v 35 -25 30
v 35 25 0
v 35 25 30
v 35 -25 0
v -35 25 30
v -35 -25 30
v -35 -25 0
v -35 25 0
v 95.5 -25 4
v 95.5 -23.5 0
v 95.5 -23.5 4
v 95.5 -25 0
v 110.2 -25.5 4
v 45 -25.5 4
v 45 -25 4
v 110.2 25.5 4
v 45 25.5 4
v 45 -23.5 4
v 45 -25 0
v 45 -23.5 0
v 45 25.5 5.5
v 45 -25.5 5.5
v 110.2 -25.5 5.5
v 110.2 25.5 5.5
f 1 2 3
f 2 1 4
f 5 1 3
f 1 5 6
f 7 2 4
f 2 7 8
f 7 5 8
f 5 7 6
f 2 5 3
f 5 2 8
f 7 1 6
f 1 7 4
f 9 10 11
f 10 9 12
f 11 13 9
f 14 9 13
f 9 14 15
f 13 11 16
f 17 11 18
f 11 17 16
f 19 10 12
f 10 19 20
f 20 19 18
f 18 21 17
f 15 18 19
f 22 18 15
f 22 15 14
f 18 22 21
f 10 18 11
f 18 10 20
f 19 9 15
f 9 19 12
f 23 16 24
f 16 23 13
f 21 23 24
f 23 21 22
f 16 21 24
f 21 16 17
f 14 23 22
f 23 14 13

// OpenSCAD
// Two-part enclosure for a small electronics board (e.g. Arduino-based temperature logger)
// Print orientation: both parts rest on the bed (z = 0), side by side, with a 10 mm gap.
// Part 1: box (open top). Part 2: lid (printed upside down, slides into the box).

// ---------------- Parameters ----------------
box_x      = 70;    // box outer length (X)
box_y      = 50;    // box outer width (Y)
box_z      = 30;    // box height (Z)
box_wall   = 2;     // box wall thickness
box_floor  = 2;     // box floor thickness (part of wall, for clarity)

lid_t      = 2;     // lid plate thickness
lip_t      = 1.5;   // lid lip (wall) thickness
lip_h      = 4;     // lid lip height
lip_outer_x = 65.6; // lip outer length (X), centred on plate
lip_outer_y = 45.6; // lip outer width (Y), centred on plate
lip_clear_x = 0.2;  // lip clearance on each side in X
lip_clear_y = 0.2;  // lip clearance on each side in Y

eps        = 0.5;   // overcut for clean boolean differences

$fn = 64;

// ---------------- Derived ----------------
lip_x  = lip_outer_x - 2 * lip_clear_x;   // lip inner length (under overcut)
lip_y  = lip_outer_y - 2 * lip_clear_y;   // lip inner width (under overcut)

// ---------------- Model ----------------
difference() {
    union() {
        // Part 1: box
        translate([-box_x/2, -box_y/2, 0])
            cube([box_x, box_y, box_z]);

        // Part 2: lid (printed upside down)
        translate([box_x/2 + 10, -box_y/2, 0])
            cube([box_y + eps, lip_t, lip_h]);                 // lip wall
        translate([box_x/2 + 10, -box_y/2 - eps, lip_h])
            cube([lip_x, box_y + 2*eps, lip_t]);               // plate under lip
    }

    // Cut the lip pocket into the box (through the open top)
    translate([box_x/2 + 10 - eps, -box_y/2 - eps, box_z - eps])
        cube([lip_x + 2*eps, box_y + 2*eps, lip_h + eps]);
}
